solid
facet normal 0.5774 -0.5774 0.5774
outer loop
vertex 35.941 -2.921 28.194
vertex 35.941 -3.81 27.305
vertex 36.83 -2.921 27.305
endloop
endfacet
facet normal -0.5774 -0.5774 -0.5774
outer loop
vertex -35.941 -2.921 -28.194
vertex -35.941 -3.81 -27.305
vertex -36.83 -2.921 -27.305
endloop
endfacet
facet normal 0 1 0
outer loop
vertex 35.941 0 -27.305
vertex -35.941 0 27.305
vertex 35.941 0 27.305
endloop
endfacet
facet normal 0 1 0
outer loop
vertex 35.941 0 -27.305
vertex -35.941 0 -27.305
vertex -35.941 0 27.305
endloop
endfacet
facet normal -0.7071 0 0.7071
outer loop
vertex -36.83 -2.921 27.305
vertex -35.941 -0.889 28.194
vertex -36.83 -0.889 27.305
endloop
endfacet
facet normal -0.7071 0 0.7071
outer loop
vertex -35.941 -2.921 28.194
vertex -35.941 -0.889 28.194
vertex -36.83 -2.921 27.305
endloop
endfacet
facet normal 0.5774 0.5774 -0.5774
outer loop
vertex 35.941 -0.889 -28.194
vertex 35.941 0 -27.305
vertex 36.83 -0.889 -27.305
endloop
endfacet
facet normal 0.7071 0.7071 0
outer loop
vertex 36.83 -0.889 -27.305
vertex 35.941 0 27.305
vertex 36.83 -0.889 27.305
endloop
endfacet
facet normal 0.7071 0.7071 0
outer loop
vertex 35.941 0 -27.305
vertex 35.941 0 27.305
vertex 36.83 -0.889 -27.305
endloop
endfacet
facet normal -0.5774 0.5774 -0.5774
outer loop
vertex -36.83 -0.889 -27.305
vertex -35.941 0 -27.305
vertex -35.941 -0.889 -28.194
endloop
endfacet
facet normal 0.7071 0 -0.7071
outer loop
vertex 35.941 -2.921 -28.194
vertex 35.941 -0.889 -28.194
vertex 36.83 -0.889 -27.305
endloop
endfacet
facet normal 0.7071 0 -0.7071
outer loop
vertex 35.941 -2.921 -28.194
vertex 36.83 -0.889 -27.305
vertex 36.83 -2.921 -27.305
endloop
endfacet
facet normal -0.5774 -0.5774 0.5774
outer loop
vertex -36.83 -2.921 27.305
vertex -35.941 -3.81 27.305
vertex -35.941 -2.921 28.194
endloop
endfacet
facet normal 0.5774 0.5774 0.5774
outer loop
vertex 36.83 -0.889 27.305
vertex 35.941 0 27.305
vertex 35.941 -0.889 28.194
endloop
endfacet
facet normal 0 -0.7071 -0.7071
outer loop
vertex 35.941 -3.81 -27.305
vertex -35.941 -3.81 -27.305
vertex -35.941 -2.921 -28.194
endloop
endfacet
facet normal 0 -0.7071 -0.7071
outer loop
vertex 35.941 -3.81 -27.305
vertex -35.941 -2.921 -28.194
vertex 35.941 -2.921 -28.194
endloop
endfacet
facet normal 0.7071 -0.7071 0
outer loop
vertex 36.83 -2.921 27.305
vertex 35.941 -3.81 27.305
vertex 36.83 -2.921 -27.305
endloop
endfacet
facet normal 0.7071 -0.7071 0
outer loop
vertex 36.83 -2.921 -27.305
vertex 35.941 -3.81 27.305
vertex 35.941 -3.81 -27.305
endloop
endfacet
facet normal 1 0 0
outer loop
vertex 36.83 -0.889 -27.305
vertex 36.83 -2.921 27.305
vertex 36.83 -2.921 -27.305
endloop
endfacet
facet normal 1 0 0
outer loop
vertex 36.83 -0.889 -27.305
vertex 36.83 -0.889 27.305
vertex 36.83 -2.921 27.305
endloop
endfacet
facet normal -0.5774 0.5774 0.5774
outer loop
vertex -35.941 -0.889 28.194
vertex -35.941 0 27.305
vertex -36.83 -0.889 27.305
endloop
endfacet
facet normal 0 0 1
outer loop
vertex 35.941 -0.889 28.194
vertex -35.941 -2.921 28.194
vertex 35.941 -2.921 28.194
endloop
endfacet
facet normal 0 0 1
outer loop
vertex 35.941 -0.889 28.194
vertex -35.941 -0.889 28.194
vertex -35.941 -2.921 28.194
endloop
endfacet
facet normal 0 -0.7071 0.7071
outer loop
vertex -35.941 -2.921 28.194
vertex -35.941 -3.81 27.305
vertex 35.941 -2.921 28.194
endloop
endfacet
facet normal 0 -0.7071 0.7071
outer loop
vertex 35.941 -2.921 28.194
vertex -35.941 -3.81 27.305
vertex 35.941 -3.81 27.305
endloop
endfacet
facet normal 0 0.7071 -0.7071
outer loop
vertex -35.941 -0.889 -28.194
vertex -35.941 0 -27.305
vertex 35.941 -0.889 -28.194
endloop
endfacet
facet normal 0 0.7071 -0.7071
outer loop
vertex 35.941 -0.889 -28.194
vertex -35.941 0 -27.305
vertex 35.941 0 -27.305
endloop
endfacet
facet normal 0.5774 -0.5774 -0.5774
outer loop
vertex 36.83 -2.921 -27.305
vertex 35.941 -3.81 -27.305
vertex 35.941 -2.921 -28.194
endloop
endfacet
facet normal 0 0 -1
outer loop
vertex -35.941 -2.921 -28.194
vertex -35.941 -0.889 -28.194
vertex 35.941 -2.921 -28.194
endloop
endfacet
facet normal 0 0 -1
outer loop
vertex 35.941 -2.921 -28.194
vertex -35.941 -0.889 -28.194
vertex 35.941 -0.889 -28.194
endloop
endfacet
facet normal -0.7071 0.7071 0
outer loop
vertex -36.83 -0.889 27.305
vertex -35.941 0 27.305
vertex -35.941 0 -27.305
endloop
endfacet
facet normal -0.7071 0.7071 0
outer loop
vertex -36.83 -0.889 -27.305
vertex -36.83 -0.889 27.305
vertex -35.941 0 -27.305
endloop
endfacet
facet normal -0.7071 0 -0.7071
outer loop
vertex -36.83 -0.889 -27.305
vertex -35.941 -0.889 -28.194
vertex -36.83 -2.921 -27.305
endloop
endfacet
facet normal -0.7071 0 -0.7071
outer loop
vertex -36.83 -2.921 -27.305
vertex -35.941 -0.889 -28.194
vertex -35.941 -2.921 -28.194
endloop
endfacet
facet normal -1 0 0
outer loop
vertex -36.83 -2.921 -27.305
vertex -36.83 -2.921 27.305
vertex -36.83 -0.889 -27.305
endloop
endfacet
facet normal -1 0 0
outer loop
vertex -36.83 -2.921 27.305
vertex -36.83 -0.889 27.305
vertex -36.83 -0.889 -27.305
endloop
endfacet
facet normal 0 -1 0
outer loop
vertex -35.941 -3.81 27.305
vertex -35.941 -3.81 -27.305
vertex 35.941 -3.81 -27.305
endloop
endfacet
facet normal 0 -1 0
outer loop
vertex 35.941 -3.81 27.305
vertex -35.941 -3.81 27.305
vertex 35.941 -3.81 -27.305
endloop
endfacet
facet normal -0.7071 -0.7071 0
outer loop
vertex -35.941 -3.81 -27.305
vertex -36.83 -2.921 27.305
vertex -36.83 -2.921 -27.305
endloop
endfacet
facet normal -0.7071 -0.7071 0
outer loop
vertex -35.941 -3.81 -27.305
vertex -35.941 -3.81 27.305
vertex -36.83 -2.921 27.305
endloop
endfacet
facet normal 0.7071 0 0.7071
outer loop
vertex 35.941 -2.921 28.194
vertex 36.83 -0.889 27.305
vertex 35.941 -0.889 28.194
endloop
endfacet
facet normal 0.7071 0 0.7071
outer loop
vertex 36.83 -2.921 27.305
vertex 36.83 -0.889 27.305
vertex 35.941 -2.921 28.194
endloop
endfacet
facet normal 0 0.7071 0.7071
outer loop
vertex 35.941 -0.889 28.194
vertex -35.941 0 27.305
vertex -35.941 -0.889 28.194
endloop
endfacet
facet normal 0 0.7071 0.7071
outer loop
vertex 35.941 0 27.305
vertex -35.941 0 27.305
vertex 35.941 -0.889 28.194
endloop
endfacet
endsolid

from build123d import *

# Parameters (mm, degrees)
SKETCH1_W           = 73.66
SKETCH1_H           = 56.388
BOSS_EXTRUDE1_DEPTH = 3.81
CHAMFER1_SIZE       = 0.889


with BuildPart() as part:
    # Sketch1 → Boss-Extrude1 (new body)
    with BuildSketch(Plane(origin=(0, 0, 0), x_dir=(1, 0, 0), z_dir=(0, 1, 0))):
        Rectangle(SKETCH1_W, SKETCH1_H)
    extrude(amount=-BOSS_EXTRUDE1_DEPTH)

    # Chamfer1
    chamfer1_edges = [part.edges().sort_by_distance(p)[0] for p in [
        (-36.83, -3.81, 0),
        (0, -3.81, 28.194),
        (36.83, -3.81, 0),
        (0, 0, 28.194),
        (-36.83, 0, 0),
        (0, 0, -28.194),
        (36.83, 0, 0),
        (0, -3.81, -28.194),
        (36.83, -1.905, 28.194),
        (-36.83, -1.905, 28.194),
        (-36.83, -1.905, -28.194),
        (36.83, -1.905, -28.194),
    ]]
    chamfer(chamfer1_edges, length=CHAMFER1_SIZE)


solid = part.part
